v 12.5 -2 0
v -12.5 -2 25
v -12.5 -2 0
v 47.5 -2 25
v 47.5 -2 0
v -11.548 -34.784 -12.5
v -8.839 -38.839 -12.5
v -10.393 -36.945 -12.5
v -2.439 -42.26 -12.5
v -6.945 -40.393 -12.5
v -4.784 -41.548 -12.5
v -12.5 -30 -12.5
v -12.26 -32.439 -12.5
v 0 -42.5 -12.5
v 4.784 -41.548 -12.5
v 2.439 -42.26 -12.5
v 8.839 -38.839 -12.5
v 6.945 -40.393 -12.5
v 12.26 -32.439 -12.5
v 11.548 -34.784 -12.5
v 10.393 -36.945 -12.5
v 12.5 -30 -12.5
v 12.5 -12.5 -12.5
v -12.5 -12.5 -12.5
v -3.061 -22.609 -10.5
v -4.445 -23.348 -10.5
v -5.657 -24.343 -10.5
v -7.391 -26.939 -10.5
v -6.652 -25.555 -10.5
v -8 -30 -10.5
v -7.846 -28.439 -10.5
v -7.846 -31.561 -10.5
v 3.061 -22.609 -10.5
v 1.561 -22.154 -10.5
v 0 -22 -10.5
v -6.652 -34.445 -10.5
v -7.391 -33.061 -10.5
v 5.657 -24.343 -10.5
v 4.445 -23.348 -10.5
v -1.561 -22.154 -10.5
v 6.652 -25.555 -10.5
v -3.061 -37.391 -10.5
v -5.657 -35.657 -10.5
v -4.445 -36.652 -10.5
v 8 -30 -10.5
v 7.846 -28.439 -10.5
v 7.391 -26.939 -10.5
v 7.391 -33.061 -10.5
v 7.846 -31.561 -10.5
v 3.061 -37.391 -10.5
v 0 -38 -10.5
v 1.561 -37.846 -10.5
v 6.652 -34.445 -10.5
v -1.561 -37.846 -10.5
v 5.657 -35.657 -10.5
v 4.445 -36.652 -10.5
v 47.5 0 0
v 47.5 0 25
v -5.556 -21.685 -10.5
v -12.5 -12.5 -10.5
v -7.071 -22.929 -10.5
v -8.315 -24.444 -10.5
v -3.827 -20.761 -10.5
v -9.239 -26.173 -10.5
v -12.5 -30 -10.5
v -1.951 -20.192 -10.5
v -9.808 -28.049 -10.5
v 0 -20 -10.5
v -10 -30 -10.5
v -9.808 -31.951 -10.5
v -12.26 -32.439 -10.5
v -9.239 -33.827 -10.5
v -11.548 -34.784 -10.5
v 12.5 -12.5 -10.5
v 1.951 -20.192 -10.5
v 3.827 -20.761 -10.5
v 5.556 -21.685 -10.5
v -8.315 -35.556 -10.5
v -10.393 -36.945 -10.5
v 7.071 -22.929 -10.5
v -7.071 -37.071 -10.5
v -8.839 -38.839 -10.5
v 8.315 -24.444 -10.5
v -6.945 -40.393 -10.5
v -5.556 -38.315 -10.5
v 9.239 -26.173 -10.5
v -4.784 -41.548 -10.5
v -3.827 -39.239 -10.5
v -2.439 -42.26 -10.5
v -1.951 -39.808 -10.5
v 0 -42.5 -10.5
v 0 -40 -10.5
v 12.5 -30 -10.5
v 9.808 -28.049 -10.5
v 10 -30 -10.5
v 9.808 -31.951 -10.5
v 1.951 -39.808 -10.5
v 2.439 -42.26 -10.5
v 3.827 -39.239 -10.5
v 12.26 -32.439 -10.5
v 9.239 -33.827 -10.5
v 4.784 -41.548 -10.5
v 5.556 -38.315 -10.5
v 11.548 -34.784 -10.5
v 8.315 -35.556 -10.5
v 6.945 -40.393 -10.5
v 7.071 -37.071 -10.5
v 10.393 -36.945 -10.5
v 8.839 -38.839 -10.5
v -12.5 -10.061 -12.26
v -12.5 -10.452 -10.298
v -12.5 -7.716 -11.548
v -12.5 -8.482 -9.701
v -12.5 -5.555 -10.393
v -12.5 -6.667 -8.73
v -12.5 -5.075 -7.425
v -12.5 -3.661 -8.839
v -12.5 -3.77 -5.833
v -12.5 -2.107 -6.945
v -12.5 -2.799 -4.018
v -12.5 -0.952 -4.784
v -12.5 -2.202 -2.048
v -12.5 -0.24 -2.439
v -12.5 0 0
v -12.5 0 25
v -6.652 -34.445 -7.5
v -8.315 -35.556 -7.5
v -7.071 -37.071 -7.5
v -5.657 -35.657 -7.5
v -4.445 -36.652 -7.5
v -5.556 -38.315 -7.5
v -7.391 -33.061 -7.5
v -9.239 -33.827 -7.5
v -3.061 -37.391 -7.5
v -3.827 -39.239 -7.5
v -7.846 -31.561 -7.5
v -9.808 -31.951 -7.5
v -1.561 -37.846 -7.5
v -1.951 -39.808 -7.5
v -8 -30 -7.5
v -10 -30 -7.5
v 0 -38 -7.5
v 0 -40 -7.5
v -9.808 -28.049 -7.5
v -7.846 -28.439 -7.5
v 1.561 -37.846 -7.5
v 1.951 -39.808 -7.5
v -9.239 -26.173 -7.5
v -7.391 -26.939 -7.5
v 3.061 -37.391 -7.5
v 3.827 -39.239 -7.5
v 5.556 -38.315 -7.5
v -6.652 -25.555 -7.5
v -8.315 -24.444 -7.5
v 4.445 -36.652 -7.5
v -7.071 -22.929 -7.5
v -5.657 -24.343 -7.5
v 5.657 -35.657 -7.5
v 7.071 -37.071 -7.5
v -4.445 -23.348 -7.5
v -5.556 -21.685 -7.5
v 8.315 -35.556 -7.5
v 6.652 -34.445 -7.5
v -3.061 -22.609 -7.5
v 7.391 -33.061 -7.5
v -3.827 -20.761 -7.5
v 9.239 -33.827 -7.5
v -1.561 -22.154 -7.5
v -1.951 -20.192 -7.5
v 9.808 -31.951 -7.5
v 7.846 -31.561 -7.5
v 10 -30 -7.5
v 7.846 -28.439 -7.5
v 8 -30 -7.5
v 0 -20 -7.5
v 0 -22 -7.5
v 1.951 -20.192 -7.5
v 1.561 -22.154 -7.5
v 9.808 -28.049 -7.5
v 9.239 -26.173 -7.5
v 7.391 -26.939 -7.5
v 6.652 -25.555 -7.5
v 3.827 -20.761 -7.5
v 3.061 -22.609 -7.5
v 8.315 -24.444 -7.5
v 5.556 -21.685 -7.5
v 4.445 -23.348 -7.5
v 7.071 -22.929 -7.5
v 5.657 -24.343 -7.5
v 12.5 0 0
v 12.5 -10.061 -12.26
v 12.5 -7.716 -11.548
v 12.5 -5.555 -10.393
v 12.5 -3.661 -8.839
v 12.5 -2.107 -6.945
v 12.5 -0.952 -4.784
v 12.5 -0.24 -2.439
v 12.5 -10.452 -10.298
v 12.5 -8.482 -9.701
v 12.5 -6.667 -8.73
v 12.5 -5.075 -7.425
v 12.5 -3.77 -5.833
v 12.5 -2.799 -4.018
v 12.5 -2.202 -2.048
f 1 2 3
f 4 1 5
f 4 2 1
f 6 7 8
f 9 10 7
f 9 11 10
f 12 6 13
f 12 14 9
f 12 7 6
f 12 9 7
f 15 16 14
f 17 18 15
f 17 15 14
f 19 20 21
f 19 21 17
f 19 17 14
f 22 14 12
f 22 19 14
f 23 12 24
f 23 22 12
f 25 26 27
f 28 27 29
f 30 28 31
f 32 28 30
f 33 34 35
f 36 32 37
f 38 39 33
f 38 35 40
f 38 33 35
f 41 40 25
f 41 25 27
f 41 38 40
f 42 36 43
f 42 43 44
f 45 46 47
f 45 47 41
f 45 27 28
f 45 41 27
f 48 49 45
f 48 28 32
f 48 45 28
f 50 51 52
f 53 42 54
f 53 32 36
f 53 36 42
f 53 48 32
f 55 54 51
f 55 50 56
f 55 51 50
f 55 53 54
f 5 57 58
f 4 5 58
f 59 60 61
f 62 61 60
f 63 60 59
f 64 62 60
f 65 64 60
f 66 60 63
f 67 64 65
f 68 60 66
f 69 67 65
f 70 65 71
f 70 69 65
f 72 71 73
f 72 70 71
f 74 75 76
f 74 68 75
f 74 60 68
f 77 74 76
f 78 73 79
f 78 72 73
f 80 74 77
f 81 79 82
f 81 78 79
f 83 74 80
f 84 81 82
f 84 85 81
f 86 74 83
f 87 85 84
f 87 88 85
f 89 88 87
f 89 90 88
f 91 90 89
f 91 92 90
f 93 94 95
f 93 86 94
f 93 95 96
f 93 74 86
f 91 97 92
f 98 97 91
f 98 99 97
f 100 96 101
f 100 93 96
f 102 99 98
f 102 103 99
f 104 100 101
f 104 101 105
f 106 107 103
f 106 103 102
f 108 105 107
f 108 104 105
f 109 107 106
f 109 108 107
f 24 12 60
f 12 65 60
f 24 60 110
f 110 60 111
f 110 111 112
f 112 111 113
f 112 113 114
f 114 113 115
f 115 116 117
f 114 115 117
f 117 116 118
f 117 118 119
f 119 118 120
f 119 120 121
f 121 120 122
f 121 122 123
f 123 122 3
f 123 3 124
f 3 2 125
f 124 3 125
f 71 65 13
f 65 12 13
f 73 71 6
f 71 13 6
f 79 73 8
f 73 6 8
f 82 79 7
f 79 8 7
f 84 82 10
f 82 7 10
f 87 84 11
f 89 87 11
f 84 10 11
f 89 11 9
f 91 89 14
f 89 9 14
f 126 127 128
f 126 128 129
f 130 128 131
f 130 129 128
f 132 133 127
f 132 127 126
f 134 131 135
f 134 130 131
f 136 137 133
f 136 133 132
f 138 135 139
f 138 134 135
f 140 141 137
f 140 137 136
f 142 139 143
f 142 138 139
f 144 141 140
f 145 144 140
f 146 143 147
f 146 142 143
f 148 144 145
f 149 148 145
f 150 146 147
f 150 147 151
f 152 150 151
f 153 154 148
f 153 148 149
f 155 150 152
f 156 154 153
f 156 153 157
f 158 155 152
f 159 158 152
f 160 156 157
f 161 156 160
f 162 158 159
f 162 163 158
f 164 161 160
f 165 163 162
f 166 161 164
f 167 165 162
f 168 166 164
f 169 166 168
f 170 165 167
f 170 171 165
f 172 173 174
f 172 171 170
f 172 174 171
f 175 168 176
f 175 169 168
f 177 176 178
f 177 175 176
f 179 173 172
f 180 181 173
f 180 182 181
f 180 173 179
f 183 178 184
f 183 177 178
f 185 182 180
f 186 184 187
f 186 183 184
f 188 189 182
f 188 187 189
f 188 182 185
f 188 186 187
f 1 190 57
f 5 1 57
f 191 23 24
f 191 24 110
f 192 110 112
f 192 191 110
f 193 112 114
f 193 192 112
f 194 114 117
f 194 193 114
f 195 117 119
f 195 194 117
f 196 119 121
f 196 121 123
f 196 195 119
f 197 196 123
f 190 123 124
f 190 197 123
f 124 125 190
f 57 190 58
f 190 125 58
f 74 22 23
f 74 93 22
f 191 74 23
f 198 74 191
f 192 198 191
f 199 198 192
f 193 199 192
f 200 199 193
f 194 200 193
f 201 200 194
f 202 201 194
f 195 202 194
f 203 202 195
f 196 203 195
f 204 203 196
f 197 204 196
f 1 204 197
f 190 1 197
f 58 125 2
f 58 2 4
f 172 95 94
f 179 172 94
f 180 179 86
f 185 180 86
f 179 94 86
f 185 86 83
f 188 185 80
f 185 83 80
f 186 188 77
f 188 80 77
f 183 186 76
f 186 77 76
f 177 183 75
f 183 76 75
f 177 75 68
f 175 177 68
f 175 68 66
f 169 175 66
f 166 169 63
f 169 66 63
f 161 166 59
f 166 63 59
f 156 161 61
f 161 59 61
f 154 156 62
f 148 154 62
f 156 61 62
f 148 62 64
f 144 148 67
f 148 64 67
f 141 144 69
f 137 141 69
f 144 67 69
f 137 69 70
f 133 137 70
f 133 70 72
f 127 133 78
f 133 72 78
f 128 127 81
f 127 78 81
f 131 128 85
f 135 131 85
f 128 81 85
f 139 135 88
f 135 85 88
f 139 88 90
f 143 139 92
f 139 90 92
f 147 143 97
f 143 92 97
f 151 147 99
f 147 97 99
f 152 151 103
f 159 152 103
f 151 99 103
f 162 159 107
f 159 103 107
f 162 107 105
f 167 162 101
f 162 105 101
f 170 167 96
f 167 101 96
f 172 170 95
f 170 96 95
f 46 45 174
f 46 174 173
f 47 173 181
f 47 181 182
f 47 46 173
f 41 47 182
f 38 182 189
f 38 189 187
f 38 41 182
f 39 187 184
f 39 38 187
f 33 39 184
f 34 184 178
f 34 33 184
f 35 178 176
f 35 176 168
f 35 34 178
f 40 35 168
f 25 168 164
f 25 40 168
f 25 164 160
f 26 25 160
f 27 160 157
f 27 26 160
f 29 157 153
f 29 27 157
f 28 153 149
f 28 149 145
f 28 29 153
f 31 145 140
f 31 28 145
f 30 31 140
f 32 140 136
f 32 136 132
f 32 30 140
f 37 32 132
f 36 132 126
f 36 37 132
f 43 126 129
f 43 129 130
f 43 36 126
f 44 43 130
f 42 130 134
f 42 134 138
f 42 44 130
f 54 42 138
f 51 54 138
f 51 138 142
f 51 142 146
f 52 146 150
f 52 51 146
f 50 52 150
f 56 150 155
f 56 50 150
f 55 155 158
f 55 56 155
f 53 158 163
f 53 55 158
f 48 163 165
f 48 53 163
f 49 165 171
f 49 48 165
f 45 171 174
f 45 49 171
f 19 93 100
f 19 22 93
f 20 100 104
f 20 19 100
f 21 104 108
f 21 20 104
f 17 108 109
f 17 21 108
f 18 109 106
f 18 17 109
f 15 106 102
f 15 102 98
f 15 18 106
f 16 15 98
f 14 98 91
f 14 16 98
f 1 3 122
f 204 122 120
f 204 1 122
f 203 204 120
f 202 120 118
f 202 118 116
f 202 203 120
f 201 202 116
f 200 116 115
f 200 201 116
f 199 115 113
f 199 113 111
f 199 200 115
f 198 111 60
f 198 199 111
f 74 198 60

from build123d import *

# Parameters (mm, degrees)
F0_W     = 60
F0_H     = 25
F1_DEPTH = 2
F3_DEPTH = 12.5
F4_R     = 12.49999
F5_R     = 10
F5_R_2   = 8
F6_DEPTH = 3


# Not quite as in the source:
# - a fillet or chamfer is up to 0.001 mm smaller than in the source, because OpenCascade refuses the exact size


with BuildPart() as f1:
    # F0 (on Front) → F1 (new body)
    with BuildSketch(Plane.XZ):
        with Locations((17.5, 12.5)):
            Rectangle(F0_W, F0_H)
    extrude(amount=F1_DEPTH)

    # F2 (on Right) → F3 (join, symmetric)
    with BuildSketch(Plane.YZ):
        with BuildLine():
            Line((-42.5, -12.5), (-12.5, -12.5))
            ThreePointArc((-12.5, -12.5), (-3.6611652352, -8.8388347648), (0, 0))
            Line((0, 0), (-2, 0))
            ThreePointArc((-2, 0), (-5.0753787975, -7.4246212025), (-12.5, -10.5))
            Line((-12.5, -10.5), (-42.5, -10.5))
            Line((-42.5, -10.5), (-42.5, -12.5))
        make_face()
    extrude(amount=F3_DEPTH, both=True)

    # F4 (radius 12.5 in the source; OpenCascade refuses exactly that, so slightly less here)
    f4_edges = [f1.edges().sort_by_distance(p)[0] for p in [
        (-12.5, -42.5, -11.5),
        (12.5, -42.5, -11.5),
    ]]
    fillet(f4_edges, radius=F4_R)

    # F5 (on face) → F6 (join)
    with BuildSketch(Plane.XY.offset(-10.5)):
        with Locations((0, -30)):
            Circle(F5_R)
        with Locations((0, -30)):
            Circle(F5_R_2, mode=Mode.SUBTRACT)
    extrude(amount=F6_DEPTH)


solid = f1.part
